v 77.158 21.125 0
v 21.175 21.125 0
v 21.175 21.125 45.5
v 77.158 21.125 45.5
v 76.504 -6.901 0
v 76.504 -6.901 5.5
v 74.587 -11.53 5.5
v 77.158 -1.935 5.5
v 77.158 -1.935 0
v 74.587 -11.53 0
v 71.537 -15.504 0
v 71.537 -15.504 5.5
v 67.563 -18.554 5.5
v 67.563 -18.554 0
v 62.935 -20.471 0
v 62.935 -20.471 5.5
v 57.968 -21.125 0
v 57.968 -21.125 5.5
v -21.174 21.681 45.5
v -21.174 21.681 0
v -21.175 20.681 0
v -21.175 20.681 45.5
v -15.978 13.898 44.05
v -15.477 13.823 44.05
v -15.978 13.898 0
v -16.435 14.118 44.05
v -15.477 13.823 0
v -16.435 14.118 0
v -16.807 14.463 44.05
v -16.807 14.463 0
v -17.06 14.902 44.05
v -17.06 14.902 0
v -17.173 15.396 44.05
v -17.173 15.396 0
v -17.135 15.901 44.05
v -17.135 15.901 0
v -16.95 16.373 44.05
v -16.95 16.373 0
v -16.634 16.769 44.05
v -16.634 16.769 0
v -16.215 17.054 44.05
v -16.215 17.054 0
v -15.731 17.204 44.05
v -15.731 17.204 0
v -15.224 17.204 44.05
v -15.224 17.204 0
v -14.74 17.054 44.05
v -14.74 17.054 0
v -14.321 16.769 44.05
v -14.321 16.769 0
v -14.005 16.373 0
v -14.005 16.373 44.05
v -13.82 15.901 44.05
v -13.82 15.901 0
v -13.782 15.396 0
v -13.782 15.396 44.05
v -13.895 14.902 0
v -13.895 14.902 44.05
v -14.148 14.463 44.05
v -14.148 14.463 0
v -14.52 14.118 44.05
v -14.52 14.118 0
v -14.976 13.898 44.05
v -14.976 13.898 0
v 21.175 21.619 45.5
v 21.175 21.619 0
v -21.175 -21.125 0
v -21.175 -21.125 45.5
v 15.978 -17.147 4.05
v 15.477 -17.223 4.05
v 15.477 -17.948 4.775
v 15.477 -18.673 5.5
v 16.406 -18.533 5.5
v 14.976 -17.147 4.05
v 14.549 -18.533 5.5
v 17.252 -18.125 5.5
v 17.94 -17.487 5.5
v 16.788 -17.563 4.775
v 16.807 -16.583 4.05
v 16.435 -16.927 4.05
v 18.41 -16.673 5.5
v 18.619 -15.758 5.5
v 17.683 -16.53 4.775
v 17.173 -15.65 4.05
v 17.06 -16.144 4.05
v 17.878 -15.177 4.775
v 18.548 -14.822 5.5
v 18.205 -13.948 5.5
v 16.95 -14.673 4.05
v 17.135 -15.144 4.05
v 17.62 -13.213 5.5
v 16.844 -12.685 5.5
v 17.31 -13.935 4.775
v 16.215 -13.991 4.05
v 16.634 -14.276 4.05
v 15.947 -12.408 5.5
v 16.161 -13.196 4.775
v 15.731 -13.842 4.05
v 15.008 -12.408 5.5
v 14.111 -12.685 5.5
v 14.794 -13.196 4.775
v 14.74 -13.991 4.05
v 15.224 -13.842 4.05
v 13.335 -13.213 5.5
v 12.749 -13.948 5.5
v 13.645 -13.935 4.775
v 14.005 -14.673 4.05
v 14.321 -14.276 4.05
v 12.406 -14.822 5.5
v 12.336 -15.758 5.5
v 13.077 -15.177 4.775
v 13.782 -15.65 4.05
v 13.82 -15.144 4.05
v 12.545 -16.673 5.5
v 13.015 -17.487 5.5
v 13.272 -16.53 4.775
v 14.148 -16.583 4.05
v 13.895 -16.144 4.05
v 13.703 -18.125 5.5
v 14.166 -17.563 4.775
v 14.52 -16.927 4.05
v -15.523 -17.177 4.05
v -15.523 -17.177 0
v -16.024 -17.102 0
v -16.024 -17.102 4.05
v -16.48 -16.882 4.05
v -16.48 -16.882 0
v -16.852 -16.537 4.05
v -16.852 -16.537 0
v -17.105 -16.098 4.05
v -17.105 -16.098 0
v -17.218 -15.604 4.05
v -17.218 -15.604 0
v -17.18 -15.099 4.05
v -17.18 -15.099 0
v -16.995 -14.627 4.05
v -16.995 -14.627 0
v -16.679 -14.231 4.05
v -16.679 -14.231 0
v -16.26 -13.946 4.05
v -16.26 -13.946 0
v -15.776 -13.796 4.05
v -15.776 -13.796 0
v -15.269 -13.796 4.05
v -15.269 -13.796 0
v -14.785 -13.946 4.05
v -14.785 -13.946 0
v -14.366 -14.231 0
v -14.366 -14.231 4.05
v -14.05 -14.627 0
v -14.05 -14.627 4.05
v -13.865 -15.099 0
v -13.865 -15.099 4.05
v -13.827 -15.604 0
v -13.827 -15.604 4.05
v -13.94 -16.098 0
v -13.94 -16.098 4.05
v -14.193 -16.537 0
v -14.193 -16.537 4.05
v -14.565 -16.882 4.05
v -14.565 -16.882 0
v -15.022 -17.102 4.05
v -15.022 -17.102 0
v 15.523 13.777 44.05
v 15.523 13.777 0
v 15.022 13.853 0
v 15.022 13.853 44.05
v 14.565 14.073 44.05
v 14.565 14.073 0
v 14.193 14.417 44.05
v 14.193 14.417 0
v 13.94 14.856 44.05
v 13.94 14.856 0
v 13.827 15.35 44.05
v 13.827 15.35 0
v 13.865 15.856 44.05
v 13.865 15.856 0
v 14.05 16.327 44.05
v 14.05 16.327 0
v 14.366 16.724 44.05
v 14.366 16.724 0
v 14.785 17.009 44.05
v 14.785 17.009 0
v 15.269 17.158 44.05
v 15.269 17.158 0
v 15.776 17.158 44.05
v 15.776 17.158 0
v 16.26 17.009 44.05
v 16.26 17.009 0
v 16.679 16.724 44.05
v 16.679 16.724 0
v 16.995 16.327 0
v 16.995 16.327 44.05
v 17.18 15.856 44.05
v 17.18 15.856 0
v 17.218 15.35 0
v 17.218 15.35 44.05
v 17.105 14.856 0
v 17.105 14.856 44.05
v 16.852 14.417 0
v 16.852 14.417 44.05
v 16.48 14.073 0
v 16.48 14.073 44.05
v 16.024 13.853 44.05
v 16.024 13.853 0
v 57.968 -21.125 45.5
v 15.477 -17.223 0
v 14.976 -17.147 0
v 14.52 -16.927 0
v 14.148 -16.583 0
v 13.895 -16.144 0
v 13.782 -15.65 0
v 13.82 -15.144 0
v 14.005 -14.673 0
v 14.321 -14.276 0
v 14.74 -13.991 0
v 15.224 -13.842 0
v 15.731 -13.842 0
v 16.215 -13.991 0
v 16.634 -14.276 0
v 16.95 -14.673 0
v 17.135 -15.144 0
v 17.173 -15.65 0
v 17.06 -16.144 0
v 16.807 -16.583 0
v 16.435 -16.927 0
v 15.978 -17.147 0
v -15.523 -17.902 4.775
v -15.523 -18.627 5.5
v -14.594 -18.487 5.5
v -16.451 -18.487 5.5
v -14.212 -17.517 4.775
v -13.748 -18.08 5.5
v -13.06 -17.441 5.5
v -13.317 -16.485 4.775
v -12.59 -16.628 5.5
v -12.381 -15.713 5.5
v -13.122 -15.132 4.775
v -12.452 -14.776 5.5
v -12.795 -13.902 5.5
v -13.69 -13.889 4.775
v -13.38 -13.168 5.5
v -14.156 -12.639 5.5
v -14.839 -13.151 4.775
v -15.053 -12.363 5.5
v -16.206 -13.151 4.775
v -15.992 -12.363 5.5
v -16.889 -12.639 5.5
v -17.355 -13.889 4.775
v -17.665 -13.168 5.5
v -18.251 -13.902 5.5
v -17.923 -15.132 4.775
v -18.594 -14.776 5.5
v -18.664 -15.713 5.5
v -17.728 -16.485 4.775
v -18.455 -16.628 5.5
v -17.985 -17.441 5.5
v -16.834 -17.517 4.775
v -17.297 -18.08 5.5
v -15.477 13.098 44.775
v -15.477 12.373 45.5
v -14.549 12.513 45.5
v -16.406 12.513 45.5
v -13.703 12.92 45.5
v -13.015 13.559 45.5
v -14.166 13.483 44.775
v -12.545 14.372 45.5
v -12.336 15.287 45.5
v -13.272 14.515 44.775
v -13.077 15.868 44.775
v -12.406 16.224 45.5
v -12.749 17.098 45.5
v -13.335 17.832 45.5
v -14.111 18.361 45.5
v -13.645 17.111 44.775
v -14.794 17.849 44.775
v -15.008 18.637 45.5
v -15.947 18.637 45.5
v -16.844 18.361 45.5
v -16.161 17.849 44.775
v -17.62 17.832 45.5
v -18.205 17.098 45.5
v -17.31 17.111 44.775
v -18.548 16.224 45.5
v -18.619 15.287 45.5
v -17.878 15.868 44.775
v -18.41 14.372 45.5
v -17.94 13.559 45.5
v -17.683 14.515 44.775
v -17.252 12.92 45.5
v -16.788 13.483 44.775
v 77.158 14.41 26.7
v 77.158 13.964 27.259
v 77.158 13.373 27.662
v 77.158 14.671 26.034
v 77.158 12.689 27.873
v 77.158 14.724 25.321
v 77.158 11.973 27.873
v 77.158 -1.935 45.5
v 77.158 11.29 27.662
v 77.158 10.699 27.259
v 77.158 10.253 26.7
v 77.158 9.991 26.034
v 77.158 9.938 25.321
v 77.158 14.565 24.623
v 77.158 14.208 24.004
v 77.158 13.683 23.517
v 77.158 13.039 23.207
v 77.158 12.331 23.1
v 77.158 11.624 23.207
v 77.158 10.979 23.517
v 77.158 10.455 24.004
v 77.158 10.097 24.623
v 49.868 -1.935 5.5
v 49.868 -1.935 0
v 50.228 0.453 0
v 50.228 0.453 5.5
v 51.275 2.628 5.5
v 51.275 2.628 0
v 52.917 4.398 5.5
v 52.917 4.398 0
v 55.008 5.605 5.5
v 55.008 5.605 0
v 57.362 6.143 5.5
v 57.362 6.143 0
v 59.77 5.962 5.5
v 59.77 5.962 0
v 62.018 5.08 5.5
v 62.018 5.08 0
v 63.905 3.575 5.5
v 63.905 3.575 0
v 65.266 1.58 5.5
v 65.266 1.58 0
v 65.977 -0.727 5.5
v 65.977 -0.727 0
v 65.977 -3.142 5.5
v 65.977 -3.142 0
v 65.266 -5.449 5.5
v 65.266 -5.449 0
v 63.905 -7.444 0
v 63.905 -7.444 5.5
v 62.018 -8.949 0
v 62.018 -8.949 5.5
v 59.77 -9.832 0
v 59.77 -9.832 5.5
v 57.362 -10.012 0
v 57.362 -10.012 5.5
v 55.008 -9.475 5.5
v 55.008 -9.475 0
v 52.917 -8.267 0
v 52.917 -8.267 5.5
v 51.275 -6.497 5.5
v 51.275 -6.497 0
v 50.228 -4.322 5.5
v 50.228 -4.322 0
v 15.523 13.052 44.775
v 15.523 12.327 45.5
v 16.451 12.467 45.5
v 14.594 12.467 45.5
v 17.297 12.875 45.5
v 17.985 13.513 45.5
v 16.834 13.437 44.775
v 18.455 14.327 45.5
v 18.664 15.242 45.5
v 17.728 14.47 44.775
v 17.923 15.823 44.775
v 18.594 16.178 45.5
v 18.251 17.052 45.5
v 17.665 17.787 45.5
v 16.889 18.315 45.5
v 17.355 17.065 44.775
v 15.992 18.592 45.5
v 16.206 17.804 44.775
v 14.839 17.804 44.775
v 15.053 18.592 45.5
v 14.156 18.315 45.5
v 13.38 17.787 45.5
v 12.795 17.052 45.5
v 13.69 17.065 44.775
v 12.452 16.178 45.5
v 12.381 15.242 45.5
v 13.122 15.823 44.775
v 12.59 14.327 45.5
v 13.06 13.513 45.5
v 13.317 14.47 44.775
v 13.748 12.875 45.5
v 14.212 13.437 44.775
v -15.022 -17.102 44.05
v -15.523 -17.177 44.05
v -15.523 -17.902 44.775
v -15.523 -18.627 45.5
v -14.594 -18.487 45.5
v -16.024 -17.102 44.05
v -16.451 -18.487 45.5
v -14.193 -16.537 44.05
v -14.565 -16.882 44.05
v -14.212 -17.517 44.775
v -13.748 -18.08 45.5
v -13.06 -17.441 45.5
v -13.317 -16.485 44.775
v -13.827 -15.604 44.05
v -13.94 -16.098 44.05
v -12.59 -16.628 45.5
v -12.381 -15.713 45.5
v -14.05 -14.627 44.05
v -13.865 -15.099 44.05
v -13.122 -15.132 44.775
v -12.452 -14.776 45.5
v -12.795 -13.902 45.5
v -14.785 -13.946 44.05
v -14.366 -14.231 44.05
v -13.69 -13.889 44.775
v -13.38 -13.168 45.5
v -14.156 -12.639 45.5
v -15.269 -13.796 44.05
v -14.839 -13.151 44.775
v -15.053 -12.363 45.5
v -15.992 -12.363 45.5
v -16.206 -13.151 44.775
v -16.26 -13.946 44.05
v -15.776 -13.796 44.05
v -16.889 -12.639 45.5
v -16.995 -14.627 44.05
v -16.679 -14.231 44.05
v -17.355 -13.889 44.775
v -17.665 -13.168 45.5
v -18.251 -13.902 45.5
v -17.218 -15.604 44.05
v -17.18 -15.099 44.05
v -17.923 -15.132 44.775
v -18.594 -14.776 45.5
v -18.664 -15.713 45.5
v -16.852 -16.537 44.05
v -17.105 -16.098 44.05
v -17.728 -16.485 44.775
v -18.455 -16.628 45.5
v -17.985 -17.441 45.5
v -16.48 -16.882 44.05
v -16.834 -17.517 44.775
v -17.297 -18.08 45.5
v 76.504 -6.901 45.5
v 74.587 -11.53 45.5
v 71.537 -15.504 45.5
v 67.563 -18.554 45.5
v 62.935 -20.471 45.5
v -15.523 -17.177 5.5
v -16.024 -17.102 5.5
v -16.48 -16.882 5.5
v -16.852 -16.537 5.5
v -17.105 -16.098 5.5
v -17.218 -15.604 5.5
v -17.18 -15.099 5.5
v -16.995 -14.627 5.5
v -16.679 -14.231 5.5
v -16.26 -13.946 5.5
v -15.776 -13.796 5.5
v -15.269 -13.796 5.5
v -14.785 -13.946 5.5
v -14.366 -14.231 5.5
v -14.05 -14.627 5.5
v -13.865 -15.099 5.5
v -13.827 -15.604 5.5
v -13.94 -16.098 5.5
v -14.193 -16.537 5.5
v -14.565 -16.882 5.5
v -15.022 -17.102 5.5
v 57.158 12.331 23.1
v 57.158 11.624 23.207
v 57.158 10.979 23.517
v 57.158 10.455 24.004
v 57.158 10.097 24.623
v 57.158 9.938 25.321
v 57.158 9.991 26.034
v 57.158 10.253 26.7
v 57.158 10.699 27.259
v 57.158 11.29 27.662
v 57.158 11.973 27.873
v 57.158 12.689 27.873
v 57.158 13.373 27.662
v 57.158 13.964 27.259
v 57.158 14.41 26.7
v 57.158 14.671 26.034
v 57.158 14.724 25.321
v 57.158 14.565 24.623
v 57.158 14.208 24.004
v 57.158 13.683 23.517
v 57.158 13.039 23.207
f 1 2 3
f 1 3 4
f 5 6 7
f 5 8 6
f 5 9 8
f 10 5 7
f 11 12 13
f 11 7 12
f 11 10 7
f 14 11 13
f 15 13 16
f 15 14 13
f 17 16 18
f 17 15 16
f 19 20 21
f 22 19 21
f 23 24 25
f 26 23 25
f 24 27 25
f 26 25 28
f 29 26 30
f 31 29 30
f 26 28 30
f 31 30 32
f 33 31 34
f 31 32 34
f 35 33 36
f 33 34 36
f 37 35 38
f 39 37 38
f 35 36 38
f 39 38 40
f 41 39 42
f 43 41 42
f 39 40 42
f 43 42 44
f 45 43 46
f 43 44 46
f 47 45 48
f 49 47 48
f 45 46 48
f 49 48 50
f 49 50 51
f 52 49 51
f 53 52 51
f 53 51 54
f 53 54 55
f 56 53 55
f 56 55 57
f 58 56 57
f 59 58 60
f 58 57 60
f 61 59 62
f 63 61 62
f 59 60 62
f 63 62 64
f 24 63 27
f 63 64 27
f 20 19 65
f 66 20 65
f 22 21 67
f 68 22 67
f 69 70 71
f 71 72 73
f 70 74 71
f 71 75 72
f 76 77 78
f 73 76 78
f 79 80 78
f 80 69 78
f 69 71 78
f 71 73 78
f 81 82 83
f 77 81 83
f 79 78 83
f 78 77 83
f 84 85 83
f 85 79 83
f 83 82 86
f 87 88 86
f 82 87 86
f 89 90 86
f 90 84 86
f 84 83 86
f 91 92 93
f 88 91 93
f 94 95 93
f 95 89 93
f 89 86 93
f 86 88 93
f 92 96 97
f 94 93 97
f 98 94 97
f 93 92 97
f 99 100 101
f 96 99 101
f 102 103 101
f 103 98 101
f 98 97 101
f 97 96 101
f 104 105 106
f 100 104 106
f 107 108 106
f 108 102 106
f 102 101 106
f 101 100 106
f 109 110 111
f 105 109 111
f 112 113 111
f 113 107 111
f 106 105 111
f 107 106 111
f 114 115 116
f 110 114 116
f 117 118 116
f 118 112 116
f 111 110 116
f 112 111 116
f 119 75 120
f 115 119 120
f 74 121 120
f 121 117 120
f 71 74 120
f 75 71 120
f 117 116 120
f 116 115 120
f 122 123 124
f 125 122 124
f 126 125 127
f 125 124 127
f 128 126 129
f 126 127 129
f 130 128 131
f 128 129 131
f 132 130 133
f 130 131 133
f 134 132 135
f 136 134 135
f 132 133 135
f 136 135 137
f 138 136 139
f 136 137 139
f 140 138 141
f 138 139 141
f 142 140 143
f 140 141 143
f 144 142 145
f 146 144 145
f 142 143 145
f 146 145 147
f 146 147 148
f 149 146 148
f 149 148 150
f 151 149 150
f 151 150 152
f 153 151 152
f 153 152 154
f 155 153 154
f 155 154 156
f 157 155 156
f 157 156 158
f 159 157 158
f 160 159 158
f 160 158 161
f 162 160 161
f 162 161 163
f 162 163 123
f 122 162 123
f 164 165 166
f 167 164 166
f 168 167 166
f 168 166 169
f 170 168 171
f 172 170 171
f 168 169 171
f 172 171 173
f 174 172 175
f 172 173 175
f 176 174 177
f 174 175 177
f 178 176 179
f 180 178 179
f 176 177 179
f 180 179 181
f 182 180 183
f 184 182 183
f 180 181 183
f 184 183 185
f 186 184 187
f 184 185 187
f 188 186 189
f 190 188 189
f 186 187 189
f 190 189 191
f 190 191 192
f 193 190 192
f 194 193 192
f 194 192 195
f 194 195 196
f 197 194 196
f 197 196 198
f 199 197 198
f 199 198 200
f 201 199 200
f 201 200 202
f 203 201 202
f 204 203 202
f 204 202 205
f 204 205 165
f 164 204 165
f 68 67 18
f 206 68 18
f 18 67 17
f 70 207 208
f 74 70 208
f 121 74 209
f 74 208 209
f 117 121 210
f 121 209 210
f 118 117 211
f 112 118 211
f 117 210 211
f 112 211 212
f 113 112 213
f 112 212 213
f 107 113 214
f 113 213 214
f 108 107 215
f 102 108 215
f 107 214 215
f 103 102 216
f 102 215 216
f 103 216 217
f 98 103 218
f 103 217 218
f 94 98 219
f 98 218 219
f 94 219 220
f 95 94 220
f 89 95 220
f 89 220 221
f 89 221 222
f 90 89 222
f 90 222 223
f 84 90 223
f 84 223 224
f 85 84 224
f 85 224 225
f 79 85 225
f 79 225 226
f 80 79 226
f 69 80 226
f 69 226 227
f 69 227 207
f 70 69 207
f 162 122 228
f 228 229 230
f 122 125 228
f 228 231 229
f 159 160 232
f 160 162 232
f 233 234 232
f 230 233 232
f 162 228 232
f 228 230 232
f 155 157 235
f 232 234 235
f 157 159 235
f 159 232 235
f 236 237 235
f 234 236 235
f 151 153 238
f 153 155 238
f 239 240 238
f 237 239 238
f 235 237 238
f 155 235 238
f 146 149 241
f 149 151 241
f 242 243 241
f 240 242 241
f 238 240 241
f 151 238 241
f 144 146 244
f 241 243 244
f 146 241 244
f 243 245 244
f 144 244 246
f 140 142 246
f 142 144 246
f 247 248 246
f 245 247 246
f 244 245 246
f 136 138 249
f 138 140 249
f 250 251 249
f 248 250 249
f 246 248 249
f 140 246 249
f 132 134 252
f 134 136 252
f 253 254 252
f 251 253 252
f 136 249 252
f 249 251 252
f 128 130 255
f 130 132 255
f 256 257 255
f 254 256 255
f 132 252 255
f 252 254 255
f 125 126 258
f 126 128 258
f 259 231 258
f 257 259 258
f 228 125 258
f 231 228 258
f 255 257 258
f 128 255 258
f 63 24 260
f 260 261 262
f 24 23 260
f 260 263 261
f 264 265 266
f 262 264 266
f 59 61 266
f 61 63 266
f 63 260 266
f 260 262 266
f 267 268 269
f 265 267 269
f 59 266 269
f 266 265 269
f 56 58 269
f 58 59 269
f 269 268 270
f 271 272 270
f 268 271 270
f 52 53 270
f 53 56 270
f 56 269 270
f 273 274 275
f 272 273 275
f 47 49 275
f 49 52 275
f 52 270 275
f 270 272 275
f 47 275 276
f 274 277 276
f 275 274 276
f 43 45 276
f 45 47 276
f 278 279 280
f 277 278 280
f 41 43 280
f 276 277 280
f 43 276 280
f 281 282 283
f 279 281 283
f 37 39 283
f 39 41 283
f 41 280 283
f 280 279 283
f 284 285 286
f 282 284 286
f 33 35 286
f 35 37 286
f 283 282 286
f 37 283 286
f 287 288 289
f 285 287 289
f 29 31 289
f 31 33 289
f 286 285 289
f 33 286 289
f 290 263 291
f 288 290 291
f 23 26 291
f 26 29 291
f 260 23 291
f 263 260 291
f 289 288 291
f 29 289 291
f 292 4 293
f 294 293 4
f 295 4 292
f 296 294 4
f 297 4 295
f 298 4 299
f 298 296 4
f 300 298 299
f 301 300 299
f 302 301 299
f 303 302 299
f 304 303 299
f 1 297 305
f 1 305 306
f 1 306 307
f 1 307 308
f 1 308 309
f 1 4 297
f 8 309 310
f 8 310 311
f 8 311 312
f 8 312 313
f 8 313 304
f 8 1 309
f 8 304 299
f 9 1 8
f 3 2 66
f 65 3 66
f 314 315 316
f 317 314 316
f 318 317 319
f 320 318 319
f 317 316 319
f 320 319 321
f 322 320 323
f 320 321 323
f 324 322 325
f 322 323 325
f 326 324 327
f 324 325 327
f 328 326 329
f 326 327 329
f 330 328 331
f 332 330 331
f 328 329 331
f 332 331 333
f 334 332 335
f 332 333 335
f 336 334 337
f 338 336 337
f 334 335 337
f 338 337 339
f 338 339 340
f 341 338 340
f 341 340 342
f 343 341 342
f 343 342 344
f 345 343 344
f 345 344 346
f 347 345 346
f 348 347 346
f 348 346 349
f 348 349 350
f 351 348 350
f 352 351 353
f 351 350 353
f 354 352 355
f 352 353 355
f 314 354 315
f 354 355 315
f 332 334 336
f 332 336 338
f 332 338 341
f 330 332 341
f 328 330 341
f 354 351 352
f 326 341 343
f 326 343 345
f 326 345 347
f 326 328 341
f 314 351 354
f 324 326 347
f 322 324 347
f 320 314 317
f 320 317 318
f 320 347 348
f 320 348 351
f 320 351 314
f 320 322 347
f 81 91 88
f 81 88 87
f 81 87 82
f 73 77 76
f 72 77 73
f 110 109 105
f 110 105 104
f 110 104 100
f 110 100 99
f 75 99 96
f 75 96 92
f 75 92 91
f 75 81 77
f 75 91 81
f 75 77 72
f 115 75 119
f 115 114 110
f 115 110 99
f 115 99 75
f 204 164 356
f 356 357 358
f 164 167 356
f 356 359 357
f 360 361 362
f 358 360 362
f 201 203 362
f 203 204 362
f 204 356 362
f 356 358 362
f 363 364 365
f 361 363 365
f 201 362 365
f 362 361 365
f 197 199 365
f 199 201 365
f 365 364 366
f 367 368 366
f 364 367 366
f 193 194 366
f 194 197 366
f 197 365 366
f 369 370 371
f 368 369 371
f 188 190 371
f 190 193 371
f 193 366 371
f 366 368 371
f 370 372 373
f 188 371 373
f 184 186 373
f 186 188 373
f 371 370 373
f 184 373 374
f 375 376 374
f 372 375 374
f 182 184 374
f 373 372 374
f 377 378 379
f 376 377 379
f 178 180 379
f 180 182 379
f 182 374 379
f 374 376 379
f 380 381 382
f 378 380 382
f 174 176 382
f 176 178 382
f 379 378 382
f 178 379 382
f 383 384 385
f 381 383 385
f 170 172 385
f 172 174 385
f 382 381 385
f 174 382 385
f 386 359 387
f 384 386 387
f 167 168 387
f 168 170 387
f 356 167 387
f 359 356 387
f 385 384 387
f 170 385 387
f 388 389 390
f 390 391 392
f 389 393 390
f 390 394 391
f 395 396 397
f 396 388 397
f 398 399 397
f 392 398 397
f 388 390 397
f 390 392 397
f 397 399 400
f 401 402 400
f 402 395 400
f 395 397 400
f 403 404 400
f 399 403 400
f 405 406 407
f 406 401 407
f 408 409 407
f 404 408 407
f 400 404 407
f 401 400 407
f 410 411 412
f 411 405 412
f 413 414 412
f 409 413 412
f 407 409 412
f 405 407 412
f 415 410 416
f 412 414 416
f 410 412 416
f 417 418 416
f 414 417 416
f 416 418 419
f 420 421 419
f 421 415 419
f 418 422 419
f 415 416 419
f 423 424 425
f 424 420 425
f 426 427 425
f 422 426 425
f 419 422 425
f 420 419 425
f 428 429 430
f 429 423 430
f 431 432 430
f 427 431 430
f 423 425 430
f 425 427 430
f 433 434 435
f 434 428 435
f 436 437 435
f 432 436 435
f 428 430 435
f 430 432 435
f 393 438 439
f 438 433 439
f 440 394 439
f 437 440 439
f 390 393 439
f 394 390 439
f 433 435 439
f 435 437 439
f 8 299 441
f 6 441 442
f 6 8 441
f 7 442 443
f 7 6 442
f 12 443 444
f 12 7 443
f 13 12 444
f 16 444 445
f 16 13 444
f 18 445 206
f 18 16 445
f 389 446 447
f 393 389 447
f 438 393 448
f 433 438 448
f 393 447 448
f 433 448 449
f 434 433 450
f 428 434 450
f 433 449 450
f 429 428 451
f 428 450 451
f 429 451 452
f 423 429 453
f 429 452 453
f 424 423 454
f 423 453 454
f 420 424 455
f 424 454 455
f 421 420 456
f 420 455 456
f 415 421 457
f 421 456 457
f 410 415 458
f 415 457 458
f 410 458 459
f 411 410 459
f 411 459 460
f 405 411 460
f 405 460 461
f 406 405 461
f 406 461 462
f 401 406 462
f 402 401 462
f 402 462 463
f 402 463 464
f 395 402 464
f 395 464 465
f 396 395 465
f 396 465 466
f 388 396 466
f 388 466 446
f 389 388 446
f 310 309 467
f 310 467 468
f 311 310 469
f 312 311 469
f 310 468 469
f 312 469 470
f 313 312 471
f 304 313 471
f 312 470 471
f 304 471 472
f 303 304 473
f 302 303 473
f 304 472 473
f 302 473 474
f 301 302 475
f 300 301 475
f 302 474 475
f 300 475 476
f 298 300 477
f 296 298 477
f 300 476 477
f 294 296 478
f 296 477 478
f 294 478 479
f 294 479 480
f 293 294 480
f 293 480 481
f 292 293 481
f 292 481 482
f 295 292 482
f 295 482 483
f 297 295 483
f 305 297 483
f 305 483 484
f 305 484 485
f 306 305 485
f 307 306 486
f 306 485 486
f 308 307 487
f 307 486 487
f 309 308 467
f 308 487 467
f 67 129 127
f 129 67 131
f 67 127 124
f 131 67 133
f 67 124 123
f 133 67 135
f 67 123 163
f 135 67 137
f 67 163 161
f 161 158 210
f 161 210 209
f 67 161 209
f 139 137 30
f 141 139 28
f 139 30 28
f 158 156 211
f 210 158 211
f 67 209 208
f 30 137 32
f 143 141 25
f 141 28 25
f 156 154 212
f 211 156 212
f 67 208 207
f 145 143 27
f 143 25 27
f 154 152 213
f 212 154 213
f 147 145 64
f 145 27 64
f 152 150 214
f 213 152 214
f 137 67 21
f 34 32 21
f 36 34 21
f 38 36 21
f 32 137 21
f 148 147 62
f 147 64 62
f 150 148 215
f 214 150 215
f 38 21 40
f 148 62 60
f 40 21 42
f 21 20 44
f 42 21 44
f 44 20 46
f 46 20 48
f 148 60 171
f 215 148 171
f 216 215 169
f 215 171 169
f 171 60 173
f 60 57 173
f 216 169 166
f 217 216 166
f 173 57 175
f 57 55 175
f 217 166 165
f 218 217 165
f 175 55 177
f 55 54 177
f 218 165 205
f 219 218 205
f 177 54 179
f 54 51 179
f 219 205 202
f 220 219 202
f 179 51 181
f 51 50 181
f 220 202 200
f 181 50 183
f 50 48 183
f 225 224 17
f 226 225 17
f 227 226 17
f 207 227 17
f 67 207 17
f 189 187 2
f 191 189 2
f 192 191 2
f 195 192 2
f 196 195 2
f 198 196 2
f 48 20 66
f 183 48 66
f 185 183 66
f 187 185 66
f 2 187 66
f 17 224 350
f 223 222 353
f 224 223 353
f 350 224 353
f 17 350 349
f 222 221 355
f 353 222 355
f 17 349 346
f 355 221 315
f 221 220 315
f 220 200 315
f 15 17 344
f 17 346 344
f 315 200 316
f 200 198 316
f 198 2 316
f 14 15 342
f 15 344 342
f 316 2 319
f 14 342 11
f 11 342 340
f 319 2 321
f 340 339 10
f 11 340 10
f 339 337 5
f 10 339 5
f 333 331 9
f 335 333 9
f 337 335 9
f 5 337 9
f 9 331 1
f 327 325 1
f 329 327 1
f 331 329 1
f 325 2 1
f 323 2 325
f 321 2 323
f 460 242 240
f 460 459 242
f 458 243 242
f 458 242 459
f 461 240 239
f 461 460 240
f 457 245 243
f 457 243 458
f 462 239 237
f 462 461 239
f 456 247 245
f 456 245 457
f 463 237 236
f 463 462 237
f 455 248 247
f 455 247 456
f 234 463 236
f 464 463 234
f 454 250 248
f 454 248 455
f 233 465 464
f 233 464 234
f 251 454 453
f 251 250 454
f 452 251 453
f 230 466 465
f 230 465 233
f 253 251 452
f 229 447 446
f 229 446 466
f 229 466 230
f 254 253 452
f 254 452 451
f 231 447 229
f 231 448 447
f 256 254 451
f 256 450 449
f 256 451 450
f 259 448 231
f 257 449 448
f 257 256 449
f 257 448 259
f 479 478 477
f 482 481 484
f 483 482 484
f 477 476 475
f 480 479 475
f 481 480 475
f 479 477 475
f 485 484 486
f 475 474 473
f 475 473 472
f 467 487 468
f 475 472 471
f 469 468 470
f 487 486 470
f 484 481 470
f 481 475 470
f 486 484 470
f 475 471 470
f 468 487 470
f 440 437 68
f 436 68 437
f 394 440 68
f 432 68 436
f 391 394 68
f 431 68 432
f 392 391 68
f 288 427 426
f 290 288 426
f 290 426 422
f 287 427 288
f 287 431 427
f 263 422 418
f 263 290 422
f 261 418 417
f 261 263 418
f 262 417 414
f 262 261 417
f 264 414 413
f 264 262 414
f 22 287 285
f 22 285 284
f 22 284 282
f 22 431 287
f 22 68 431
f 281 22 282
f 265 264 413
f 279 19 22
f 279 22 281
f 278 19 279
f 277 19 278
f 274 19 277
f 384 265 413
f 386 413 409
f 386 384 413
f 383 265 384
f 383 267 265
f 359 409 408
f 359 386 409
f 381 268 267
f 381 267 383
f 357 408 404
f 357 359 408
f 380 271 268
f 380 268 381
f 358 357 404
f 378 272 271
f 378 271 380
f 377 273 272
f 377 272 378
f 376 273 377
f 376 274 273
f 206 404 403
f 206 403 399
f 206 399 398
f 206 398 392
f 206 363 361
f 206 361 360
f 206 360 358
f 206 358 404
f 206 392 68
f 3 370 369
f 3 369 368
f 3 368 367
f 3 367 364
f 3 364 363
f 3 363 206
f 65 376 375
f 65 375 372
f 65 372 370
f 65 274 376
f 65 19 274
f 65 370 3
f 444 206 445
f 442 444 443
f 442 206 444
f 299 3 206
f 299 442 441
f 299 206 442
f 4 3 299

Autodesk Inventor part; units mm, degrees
ref_plane "YZ Plane" through (0, 0, 0) normal (1, 0, 0) x (0, 1, 0)
ref_plane "XZ Plane" through (0, 0, 0) normal (0, 1, 0) x (-1, 0, 0)
sketch "Sketch1" plane through (0, 0, 0) normal (0, 0, 1) x (1, 0, 0)
  arc A0 (14.1427, -15.2387) -> (13.4175, -14.0632) centre (13.1646, -15.0307) ccw projected
  line L0 (13.4175, -14.0632) -> (9.4746, -13.0327) projected
  arc A1 (9.4746, -13.0327) -> (0.5427, -12.0878) centre (1.8884, -42.0576) ccw projected
  arc A2 (1.3475, 12.0247) -> (0.5427, -12.0878) centre (0, 0) ccw projected
  arc A3 (1.3475, 12.0247) -> (10.3225, 12.3719) centre (4.6883, 41.8381) ccw projected
  line L1 (10.3225, 12.3719) -> (21.175, 14.447) projected
  line L2 (21.175, 14.447) -> (21.175, 21.6191) projected
  line L3 (-21.175, 20.6809) -> (-21.175, -21.125) projected
  line L4 (-21.175, -21.125) -> (21.175, -21.125) projected
  line L5 (21.175, -21.125) -> (21.175, -16.0908) projected
  line L6 (21.175, -16.0908) -> (17.9879, -15.2578) projected
  arc A4 (17.9879, -15.2578) -> (16.7802, -15.9281) centre (17.735, -16.2253) ccw projected
  arc A5 (14.1427, -15.2387) -> (16.7802, -15.9281) centre (15.4774, -15.5226) ccw projected
  circle A6 centre (-15.4774, 15.5226) radius 1.3645 projected
  circle A7 centre (-15.5226, -15.4774) radius 1.3645 projected
  circle A8 centre (15.5226, 15.4774) radius 1.3645 projected
  circle A9 centre (57.9677, -1.9346) radius 4.2 projected
  circle A10 centre (57.9677, -1.9346) radius 19.1904
  line L7 (21.175, -21.125) -> (57.9677, -21.125)
  line L8 (21.175, 21.125) -> (77.1581, 21.125)
  line L9 (77.1581, 21.125) -> (77.1581, -1.9346)
  line L10 (-21.1741, 21.6809) -> (21.175, 21.6191) projected
  line L11 (-21.1741, 21.6809) -> (-21.1756, 20.6809) projected
  line L12 (-21.175, 20.6809) -> (-21.1756, 20.6809) projected
  point P0 (0, 0)
  point P1 (-21.175, 21.125)
extrude "Extrusion1" add sketch "Sketch1" along normal blind 5.5
sketch "Sketch2" plane through (0, 0, 5.5) normal (0, 0, 1) x (1, 0, 0)
  line L0 (77.1581, -1.9346) -> (77.1581, 21.125) projected
  line L1 (-21.175, 20.6809) -> (-21.175, -21.125) projected
  line L2 (-21.175, -21.125) -> (57.9677, -21.125) projected
  arc A0 (57.9677, -21.125) -> (77.1581, -1.9346) centre (57.9677, -1.9346) ccw projected
  circle A1 centre (15.5226, 15.4774) radius 1.3645 projected
  circle A2 centre (-15.5226, -15.4774) radius 1.3645 projected
  circle A3 centre (-15.4774, 15.5226) radius 1.3645 projected
  circle A4 centre (57.9677, -1.9346) radius 4.2 projected
  line L3 (110.8694, -1.8119) -> (-349.1301, -1.1403) projected
  line L4 (110.8699, -1.5119) -> (-349.1296, -0.8403)
  line L5 (21.175, 21.6191) -> (-21.1741, 21.6809) projected
  line L6 (-21.1741, 21.6809) -> (-21.1756, 20.6809) projected
  line L7 (-21.1756, 20.6809) -> (-21.175, 20.6809) projected
  line L8 (77.1581, 21.125) -> (21.175, 21.125) projected
  line L9 (21.175, 21.125) -> (21.175, 21.6191) projected
  point P0 (0, 0)
  point P1 (-21.175, -1.3191)
  point P2 (77.1581, -1.4626)
  dimension "d2" = 0.3
ref_plane "Work Plane1" through (-349.1377, -7.0016, 45.5) normal (0, 0, 1) x (1, -0.0015, 0)
extrude "Extrusion2" add sketch "Sketch2" along normal up to surface (40 mm away) contours A0 L2 L1 L3 A4 L0 | L3 A4 L4 L0 | L4 A4 L1 L6 L5 L9 L8 L0 | L3 A4 L4 | A4 L3 | L4 A4 | L3 L1 L4 A4 | A2
sketch "Sketch3" plane through (-21.175, 26.125, 0) normal (0, 1, 0) x (1, 0, 0)
  line L0 (-327.9643, -38.4057) -> (-327.9643, -32.5943) projected
  line L1 (132.0352, -38.4057) -> (-327.9643, -38.4057) projected
  line L2 (132.0352, -38.4057) -> (132.0352, -32.5943) projected
  line L3 (132.0352, -32.5943) -> (-327.9643, -32.5943) projected
  line L4 (-327.9643, -18.4057) -> (-327.9643, -12.5943) projected
  line L5 (132.0352, -18.4057) -> (-327.9643, -18.4057) projected
  line L6 (132.0352, -18.4057) -> (132.0352, -12.5943) projected
  line L7 (132.0352, -12.5943) -> (-327.9643, -12.5943) projected
  line L8 (98.3331, 0) -> (98.3331, -45.5) projected
  line L9 (0, 0) -> (0, -45.5) projected
  point P0 (21.175, 0)
  point P1 (83.3331, -35.5)
  point P2 (83.3331, -35.5)
  point P3 (15, -15.5)
  point P4 (83.3331, -15.5)
  point P5 (15, -35.5)
  dimension "d8" = 15
  dimension "d9" = 15
hole "Hole1" [suppressed]
sketch "Sketch4" plane through (-21.175, 26.125, 45.5) normal (0, 0, 1) x (1, 0, 0)
  circle A0 centre (36.6976, -10.6476) radius 1.3645 projected
  circle A1 centre (5.6976, -10.6024) radius 1.3645 projected
  circle A2 centre (5.6523, -41.6024) radius 1.3645 projected
  point P0 (21.175, -26.125)
hole "Hole2" at (15.5226, 15.4774, 45.5) at (-15.4774, 15.5226, 45.5) at (-15.5226, -15.4774, 45.5) direction (0, 0, -1) diameter 3.4 end through all countersink diameter 6.3 countersink angle 90 clearance for "Countersunk Flat Head Screw ISO 2009/7046" size "M3" standard "ISO"
sketch "Sketch5" plane through (0, 0, 0) normal (0, 0, -1) x (-1, 0, 0)
  arc A0 (-62.1677, -1.9346) -> (-62.1677, -1.9346) centre (-57.9677, -1.9346) ccw projected
  circle A1 centre (-57.9677, -1.9346) radius 8.1
  point P0 (0, 0)
  dimension "d24" = 16.2
extrude "Extrusion3" cut sketch "Sketch5" against normal up to surface (5.5 mm away) contours A0 | A1
sketch "Sketch6" plane through (0, 0, 5.5) normal (0, 0, 1) x (1, 0, 0)
  circle A0 centre (15.4774, -15.5226) radius 2.3806 projected
  circle A1 centre (-15.5226, -15.4774) radius 1.7 projected
  point P0 (0, 0)
hole "Hole3" at (15.4774, -15.5226, 5.5) at (-15.5226, -15.4774, 5.5) direction (0, 0, -1) diameter 3.4 end through all countersink diameter 6.3 countersink angle 90 clearance for "Countersunk Flat Head Screw ISO 2009/7046" size "M3" standard "ISO"
sketch "Sketch7" plane through (77.1581, -1.9346, 5.5) normal (1, 0, 0) x (0, 0, -1)
  circle A0 centre (-20, 14.2658) radius 4.5 projected
  point P0 (5.5, 1.9346)
hole "Hole4" at (77.1581, 12.3312, 25.5) direction (-1, 0, 0) diameter 4.8 depth 20
properties part number "PRINTED right z mount 2"
